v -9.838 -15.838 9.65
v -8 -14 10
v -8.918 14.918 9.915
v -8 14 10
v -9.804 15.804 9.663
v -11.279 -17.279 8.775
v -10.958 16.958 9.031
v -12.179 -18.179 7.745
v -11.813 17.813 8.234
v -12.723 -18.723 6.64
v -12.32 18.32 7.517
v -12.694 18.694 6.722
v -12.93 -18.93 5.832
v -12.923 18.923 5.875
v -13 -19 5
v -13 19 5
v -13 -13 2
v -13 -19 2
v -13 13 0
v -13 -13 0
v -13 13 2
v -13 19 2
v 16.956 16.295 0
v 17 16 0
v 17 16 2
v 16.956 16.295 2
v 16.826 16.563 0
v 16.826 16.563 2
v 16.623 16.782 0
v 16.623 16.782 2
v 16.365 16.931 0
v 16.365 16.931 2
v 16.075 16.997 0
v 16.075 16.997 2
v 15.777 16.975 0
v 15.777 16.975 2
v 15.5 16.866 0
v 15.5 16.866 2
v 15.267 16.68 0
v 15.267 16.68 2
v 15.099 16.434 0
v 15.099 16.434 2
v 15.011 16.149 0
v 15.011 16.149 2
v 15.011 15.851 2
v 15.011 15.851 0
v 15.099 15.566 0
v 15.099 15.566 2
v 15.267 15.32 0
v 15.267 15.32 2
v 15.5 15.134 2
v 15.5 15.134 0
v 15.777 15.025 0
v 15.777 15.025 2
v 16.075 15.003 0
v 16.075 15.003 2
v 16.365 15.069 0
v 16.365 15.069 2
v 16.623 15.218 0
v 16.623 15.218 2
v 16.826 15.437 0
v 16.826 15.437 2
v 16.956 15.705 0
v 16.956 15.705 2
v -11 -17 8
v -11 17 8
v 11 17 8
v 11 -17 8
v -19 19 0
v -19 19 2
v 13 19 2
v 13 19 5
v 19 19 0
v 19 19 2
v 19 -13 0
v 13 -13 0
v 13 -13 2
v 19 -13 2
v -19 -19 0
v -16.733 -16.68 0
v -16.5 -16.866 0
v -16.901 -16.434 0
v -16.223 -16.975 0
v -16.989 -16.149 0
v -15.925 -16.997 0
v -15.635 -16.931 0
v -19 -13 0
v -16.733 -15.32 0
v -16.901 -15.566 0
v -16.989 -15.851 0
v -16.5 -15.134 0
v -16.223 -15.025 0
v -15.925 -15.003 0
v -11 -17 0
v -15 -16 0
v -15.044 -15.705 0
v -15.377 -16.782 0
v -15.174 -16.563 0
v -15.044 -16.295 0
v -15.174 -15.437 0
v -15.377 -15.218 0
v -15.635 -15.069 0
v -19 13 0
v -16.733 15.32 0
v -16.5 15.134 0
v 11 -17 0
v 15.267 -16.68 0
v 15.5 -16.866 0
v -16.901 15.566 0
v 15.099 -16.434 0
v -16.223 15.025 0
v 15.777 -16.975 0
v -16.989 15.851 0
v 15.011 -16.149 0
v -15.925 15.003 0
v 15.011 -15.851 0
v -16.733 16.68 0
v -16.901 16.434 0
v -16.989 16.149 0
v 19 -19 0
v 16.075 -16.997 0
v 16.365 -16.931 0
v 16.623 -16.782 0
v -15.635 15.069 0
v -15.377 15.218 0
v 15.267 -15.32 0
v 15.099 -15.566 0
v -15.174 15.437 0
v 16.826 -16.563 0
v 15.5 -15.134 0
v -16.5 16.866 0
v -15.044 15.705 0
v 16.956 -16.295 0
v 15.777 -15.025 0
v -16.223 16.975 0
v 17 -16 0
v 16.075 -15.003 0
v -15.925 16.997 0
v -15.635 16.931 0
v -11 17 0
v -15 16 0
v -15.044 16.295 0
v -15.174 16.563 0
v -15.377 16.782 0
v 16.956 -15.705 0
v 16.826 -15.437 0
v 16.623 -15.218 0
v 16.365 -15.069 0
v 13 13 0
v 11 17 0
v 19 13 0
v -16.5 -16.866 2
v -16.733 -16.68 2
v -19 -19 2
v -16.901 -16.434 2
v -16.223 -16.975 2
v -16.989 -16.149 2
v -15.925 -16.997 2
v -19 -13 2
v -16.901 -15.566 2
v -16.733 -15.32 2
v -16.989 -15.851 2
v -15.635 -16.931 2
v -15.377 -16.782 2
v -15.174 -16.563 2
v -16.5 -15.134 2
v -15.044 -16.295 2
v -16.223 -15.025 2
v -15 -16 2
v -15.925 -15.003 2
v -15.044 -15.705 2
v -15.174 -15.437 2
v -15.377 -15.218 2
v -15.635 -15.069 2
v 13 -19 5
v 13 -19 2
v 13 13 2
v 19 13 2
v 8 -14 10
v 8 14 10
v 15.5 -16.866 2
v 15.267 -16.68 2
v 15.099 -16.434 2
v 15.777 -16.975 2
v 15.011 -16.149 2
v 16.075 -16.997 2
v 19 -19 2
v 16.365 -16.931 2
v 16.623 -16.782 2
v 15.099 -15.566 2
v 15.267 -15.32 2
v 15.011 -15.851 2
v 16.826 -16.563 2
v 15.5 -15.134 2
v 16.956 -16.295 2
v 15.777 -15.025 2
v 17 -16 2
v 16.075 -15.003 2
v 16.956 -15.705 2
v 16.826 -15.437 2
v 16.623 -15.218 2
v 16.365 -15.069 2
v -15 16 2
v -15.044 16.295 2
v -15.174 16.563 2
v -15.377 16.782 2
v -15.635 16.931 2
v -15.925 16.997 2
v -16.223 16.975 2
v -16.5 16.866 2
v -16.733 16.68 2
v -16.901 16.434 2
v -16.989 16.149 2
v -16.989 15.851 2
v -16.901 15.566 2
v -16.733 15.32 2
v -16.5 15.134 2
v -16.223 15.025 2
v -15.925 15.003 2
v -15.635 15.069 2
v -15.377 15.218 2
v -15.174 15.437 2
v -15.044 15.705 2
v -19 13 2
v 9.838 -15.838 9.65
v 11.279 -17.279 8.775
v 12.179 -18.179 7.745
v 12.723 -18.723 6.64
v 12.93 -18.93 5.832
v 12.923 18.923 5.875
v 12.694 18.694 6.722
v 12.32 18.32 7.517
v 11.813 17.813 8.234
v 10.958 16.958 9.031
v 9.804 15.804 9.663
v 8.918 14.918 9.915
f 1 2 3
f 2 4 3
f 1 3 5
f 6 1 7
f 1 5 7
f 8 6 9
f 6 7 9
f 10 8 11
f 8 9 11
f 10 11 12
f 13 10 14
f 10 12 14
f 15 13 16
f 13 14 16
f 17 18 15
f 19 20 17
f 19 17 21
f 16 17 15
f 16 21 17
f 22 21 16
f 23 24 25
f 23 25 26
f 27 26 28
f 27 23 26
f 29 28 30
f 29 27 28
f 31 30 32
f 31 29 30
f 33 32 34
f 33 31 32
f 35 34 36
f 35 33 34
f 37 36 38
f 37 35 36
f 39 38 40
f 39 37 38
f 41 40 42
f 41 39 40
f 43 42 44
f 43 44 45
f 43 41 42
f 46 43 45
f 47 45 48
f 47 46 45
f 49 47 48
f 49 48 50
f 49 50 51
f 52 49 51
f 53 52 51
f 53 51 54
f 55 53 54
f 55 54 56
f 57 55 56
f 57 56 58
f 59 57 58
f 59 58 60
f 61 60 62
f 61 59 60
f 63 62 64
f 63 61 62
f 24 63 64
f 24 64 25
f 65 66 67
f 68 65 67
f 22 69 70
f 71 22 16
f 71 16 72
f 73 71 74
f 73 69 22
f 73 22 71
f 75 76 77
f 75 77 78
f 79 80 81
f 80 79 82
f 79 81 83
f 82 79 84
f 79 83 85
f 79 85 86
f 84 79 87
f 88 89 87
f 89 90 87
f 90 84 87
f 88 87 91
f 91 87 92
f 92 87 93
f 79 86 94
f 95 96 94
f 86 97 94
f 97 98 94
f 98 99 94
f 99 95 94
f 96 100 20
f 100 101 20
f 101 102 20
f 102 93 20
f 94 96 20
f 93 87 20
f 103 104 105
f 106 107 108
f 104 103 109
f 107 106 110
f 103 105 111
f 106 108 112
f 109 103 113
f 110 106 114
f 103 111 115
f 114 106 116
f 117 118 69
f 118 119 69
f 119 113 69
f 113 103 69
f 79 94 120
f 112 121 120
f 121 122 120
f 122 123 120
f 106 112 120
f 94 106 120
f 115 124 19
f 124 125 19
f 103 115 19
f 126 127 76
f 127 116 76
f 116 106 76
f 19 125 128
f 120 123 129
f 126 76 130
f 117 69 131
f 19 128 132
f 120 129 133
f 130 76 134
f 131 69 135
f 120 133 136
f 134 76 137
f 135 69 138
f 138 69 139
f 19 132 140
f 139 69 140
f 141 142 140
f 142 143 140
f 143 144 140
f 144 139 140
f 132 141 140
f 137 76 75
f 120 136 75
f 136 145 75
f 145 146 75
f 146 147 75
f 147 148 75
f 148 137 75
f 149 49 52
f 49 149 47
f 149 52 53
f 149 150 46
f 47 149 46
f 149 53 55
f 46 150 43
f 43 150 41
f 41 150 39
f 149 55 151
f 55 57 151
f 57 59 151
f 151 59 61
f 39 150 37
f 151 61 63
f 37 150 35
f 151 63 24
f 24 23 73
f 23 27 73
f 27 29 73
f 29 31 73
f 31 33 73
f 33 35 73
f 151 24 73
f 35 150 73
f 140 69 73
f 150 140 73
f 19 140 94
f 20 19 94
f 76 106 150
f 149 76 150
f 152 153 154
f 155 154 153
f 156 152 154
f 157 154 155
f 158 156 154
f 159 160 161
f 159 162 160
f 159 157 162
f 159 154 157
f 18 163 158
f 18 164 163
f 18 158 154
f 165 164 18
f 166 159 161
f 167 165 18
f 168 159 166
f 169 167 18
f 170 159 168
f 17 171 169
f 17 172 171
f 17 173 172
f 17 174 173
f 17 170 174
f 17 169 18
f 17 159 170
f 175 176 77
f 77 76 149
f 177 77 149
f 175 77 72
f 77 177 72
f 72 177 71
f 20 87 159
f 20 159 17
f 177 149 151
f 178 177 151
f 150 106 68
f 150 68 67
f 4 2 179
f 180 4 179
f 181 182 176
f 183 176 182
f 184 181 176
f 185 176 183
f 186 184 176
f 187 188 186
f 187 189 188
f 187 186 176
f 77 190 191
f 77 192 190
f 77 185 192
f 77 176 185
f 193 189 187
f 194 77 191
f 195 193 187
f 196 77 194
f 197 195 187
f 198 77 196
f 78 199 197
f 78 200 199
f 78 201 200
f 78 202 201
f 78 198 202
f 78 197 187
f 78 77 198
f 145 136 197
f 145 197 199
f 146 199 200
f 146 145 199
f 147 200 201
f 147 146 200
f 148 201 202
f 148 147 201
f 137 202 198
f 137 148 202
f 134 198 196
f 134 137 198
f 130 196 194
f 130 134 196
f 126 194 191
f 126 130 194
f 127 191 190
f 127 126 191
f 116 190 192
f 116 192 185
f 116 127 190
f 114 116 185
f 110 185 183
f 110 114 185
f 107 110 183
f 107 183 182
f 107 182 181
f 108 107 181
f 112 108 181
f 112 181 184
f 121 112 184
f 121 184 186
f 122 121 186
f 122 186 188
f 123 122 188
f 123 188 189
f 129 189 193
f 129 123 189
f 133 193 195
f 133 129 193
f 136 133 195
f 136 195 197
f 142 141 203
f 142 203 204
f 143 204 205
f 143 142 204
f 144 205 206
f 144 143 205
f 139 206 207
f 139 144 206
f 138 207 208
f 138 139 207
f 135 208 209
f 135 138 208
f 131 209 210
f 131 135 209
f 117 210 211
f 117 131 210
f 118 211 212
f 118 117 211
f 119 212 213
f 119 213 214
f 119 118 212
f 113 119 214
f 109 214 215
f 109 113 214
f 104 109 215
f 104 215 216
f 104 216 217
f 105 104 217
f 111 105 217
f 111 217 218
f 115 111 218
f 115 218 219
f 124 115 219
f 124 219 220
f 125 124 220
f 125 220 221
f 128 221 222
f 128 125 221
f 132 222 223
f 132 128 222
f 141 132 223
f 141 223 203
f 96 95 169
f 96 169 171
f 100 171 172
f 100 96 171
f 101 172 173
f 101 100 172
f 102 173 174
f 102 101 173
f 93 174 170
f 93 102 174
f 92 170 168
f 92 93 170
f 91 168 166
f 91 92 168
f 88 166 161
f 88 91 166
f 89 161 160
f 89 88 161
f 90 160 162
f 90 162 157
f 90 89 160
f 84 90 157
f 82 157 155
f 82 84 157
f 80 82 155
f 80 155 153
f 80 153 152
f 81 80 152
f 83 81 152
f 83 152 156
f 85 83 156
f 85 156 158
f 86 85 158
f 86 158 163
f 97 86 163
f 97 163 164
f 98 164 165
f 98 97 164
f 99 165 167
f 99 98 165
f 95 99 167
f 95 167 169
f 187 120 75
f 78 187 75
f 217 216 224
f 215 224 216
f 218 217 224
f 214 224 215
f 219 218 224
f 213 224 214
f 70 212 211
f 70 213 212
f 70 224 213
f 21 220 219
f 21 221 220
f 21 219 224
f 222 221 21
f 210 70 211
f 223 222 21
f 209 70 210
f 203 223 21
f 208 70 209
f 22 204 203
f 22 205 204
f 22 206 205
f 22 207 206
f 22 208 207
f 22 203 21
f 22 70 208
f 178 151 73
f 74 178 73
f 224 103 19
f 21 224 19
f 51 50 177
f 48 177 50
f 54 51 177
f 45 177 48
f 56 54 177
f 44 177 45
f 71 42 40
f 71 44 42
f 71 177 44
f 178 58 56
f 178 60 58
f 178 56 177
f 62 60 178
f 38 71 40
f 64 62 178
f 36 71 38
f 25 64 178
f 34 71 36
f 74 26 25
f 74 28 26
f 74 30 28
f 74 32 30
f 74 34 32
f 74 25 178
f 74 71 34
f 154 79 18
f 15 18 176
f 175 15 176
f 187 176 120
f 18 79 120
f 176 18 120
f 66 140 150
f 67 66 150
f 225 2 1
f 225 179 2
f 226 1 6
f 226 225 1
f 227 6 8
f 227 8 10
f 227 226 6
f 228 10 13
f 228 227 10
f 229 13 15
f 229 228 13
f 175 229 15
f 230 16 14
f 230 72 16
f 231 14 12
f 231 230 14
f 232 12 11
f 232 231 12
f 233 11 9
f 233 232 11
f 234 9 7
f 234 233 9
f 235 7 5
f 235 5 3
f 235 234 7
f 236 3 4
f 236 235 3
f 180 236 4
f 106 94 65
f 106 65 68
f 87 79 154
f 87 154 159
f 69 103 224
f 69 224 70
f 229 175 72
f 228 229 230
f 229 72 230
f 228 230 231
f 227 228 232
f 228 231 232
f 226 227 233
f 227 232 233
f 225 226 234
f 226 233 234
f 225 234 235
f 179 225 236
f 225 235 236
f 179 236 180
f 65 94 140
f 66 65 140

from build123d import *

# Parameters (mm, degrees)
SKETCH_1_W          = 26
SKETCH_1_H          = 38
EXTRUDE_1_DEPTH     = 10
SKETCH_2_W          = 22
SKETCH_2_H          = 34
CUT_EXTRUDE_1_DEPTH = 8
SKETCH_4_W          = 6
SKETCH_4_H          = 6
EXTRUDE_2_DEPTH     = 2
SKETCH_5_R          = 1
CUT_EXTRUDE_4_DEPTH = 2
FILLET_1_R          = 5


with BuildPart() as part:
    # ｽｹｯﾁ1 → ﾎﾞｽ - 押し出し1 (new body)
    with BuildSketch(Plane.XY):
        Rectangle(SKETCH_1_W, SKETCH_1_H)
    extrude(amount=EXTRUDE_1_DEPTH)

    # ｽｹｯﾁ2 → ｶｯﾄ - 押し出し1 (cut)
    with BuildSketch(Plane.XY):
        Rectangle(SKETCH_2_W, SKETCH_2_H)
    extrude(amount=CUT_EXTRUDE_1_DEPTH, mode=Mode.SUBTRACT)

    # ｽｹｯﾁ4 → ﾎﾞｽ - 押し出し2 (add)
    with BuildSketch(Plane.XY):
        with Locations((16, 16)):
            Rectangle(SKETCH_4_W, SKETCH_4_H)
        with Locations((16, -16)):
            Rectangle(SKETCH_4_W, SKETCH_4_H)
        with Locations((-16, -16)):
            Rectangle(SKETCH_4_W, SKETCH_4_H)
        with Locations((-16, 16)):
            Rectangle(SKETCH_4_W, SKETCH_4_H)
    extrude(amount=EXTRUDE_2_DEPTH)

    # ｽｹｯﾁ5 → ｶｯﾄ - 押し出し4 (cut)
    with BuildSketch(Plane.XY):
        with Locations((-16, 16)):
            Circle(SKETCH_5_R)
        with Locations((-16, -16)):
            Circle(SKETCH_5_R)
        with Locations((16, -16)):
            Circle(SKETCH_5_R)
        with Locations((16, 16)):
            Circle(SKETCH_5_R)
    extrude(amount=CUT_EXTRUDE_4_DEPTH, mode=Mode.SUBTRACT)

    # ﾌｨﾚｯﾄ1
    fillet_1_edges = [part.edges().sort_by_distance(p)[0] for p in [
        (0, 19, 10),
        (0, -19, 10),
        (13, 0, 10),
        (-13, 0, 10),
    ]]
    fillet(fillet_1_edges, radius=FILLET_1_R)


solid = part.part
